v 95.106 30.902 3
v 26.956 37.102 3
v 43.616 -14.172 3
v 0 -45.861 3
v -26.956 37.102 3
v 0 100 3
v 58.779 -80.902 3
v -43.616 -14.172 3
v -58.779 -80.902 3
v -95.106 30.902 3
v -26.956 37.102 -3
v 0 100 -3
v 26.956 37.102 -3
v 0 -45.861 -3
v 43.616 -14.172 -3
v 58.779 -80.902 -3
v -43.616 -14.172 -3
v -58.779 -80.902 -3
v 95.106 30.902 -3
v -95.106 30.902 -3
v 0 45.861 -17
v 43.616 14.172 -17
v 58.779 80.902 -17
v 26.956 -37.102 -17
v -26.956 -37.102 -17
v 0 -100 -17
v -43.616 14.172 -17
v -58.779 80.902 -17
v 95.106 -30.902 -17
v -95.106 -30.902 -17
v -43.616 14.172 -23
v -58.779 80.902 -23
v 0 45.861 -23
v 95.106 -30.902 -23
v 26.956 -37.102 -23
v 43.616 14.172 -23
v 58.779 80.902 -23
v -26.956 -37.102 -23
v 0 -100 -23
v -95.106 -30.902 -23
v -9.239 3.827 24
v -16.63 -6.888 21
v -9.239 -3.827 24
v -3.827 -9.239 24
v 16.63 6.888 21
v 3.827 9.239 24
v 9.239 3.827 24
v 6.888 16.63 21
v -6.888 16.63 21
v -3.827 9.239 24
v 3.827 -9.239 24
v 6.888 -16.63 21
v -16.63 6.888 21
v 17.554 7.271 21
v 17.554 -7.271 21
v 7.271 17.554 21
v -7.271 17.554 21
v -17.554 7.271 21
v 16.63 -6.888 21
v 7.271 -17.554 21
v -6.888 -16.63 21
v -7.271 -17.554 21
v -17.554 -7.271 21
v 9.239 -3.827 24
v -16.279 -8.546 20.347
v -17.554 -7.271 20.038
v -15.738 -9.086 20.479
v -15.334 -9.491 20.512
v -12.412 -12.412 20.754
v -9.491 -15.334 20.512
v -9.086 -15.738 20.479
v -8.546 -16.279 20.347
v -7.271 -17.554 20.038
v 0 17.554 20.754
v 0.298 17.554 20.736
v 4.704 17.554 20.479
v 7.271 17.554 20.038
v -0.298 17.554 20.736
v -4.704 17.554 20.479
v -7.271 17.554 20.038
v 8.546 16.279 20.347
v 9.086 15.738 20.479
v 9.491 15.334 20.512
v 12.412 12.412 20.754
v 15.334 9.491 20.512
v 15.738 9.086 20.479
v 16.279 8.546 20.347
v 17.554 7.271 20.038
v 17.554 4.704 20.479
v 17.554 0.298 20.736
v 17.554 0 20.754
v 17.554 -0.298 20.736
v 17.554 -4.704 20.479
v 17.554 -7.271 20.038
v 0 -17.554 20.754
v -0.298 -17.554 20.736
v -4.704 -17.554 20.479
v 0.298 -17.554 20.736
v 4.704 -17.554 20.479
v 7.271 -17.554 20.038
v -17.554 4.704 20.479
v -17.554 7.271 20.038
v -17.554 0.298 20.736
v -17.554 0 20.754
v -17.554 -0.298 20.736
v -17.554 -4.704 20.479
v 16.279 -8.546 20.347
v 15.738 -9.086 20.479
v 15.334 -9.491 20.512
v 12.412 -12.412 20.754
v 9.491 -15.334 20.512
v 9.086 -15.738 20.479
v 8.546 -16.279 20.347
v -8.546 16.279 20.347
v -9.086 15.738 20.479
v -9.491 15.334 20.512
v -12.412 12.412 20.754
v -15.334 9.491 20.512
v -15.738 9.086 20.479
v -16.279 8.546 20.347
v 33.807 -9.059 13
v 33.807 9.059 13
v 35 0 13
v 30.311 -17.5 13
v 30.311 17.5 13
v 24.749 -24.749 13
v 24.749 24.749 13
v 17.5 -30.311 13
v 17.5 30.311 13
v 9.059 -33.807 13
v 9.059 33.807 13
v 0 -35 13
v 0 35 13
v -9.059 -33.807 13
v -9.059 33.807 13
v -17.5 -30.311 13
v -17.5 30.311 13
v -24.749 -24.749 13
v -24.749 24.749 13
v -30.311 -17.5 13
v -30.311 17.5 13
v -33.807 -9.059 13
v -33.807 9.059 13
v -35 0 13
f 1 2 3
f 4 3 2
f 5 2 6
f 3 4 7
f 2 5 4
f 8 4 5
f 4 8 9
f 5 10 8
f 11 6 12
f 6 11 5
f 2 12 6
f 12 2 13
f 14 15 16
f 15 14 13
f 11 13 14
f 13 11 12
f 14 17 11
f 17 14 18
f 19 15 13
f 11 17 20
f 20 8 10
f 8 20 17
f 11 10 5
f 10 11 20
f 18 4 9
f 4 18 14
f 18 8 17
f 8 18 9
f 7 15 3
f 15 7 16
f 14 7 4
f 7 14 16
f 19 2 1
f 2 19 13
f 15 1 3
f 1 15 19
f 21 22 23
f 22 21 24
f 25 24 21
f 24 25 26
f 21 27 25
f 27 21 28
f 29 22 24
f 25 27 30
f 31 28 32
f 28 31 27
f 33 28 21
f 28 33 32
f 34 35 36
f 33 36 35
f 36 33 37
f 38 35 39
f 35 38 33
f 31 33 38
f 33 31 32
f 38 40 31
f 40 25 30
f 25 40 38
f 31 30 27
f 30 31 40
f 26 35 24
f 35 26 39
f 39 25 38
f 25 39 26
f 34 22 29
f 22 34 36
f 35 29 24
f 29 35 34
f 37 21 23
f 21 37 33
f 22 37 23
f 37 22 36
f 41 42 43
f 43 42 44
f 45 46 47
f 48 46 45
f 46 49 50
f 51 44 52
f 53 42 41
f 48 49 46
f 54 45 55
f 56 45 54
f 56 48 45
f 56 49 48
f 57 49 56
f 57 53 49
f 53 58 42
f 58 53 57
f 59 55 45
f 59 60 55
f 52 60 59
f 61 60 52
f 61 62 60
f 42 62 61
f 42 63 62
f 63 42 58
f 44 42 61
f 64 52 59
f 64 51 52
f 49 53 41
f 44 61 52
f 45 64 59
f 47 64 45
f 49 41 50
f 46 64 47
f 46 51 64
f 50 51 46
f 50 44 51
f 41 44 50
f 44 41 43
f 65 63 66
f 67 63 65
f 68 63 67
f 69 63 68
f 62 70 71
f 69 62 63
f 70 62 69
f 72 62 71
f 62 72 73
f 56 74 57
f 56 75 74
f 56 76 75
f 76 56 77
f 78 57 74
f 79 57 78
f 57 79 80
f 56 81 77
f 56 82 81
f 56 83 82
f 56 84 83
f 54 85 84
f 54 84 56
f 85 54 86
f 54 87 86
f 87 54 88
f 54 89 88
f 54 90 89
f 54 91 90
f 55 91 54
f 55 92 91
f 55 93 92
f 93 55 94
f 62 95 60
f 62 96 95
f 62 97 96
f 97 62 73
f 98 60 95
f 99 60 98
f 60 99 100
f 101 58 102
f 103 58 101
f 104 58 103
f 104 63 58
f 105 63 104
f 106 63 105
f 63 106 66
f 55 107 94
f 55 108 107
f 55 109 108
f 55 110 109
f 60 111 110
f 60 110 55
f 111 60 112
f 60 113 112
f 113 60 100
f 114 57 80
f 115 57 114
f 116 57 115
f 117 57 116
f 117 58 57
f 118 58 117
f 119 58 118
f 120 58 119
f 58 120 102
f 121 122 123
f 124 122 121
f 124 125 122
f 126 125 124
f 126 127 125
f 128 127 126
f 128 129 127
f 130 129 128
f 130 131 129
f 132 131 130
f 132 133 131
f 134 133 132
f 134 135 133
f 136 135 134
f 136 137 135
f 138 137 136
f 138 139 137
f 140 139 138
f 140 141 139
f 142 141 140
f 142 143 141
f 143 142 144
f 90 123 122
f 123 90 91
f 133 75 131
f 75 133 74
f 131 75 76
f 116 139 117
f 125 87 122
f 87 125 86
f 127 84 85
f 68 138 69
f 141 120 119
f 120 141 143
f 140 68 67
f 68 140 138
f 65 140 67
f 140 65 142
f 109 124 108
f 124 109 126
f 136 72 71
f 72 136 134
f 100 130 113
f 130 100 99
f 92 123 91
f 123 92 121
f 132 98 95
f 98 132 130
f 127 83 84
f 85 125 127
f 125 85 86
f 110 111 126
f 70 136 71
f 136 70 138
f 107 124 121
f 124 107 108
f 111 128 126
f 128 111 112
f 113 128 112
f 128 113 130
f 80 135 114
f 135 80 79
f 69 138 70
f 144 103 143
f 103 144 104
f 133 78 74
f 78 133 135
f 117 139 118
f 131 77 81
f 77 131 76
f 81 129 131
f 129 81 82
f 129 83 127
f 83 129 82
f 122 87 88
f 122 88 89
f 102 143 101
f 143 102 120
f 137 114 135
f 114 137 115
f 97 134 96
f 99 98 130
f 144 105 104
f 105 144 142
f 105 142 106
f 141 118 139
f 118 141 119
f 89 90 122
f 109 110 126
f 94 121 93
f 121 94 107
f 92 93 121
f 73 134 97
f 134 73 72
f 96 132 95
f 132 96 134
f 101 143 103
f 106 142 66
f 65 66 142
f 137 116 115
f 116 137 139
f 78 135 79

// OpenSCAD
module estrella(){
    color([64/255,42/255,99/255])
    union(){        
        for(angle=[0:72:288]){
            rotate([0,0,angle])
            parteestrella();
        }
    }
}

module parteestrella(){
   union(){       
       translate([0,0,3])
       polyhedronestrella();
       linear_extrude(height=6,center=true){
           polygon([[0,0], [30,30], [0,100],[-30,30]]);
           }      
       translate([0,0,-3])
       rotate([0,180,0])
       polyhedronestrella();          
    }
}

module polyhedronestrella(){
    polyhedron(
        points=[ [0,100,0],[-30,30,0],[30,30,0],[0,0,0], // the four points at base
                [0,0,15]],                                 // the apex point 
        faces=[ [0,1,4],[0,2,4],[2,3,4],[3,0,4],              // each triangle side
              [0,1,3],[0,2,3]]                         // two triangles for square base
    );   
 }
     
 module partebase(){
     w = 5; //ancho/2
     h = 8; //height
     ext= 36; //
     ri = 17; 
 
     polyhedron(
         
    points=[ [-w,0,h],[w,0,h],[w, ext, 0],[-w, ext,0], //
             [-2*w, ext*0.4 ,0], [2*w, ext*0.4, 0]  ],  //
    faces=[ [0,1,3],[1,2,3], //
            [0,3,4],[1,2,5]]  //                       
    );
}
     
 module base(){
     union(){
    
         rotate([0,0,22.5])
         union(){
         color([1,0,0])
         translate([0,0,8])
         cylinder(3,18,10,$fn=8); //rubi
         color([1,1,0])
         cylinder(8,19,19,$fn=8); //
         }
         
         color([1,1,0])
         cylinder(8,35,17,$fn=24);
         
         color([1,1,0])
         for(i=[0:45:315]){
            rotate([0,0,i])   
            translate([0,18,0])
            partebase();
         }
    }
}

  module starmie(){
      union(){
          estrella();
          translate([0,0,-20])
          rotate([0,0,36]) 
          estrella();
          translate([0,0,13])
          base();
          }
      }  
    
 //translate([0,0,-20])     
 starmie();
 //base();
